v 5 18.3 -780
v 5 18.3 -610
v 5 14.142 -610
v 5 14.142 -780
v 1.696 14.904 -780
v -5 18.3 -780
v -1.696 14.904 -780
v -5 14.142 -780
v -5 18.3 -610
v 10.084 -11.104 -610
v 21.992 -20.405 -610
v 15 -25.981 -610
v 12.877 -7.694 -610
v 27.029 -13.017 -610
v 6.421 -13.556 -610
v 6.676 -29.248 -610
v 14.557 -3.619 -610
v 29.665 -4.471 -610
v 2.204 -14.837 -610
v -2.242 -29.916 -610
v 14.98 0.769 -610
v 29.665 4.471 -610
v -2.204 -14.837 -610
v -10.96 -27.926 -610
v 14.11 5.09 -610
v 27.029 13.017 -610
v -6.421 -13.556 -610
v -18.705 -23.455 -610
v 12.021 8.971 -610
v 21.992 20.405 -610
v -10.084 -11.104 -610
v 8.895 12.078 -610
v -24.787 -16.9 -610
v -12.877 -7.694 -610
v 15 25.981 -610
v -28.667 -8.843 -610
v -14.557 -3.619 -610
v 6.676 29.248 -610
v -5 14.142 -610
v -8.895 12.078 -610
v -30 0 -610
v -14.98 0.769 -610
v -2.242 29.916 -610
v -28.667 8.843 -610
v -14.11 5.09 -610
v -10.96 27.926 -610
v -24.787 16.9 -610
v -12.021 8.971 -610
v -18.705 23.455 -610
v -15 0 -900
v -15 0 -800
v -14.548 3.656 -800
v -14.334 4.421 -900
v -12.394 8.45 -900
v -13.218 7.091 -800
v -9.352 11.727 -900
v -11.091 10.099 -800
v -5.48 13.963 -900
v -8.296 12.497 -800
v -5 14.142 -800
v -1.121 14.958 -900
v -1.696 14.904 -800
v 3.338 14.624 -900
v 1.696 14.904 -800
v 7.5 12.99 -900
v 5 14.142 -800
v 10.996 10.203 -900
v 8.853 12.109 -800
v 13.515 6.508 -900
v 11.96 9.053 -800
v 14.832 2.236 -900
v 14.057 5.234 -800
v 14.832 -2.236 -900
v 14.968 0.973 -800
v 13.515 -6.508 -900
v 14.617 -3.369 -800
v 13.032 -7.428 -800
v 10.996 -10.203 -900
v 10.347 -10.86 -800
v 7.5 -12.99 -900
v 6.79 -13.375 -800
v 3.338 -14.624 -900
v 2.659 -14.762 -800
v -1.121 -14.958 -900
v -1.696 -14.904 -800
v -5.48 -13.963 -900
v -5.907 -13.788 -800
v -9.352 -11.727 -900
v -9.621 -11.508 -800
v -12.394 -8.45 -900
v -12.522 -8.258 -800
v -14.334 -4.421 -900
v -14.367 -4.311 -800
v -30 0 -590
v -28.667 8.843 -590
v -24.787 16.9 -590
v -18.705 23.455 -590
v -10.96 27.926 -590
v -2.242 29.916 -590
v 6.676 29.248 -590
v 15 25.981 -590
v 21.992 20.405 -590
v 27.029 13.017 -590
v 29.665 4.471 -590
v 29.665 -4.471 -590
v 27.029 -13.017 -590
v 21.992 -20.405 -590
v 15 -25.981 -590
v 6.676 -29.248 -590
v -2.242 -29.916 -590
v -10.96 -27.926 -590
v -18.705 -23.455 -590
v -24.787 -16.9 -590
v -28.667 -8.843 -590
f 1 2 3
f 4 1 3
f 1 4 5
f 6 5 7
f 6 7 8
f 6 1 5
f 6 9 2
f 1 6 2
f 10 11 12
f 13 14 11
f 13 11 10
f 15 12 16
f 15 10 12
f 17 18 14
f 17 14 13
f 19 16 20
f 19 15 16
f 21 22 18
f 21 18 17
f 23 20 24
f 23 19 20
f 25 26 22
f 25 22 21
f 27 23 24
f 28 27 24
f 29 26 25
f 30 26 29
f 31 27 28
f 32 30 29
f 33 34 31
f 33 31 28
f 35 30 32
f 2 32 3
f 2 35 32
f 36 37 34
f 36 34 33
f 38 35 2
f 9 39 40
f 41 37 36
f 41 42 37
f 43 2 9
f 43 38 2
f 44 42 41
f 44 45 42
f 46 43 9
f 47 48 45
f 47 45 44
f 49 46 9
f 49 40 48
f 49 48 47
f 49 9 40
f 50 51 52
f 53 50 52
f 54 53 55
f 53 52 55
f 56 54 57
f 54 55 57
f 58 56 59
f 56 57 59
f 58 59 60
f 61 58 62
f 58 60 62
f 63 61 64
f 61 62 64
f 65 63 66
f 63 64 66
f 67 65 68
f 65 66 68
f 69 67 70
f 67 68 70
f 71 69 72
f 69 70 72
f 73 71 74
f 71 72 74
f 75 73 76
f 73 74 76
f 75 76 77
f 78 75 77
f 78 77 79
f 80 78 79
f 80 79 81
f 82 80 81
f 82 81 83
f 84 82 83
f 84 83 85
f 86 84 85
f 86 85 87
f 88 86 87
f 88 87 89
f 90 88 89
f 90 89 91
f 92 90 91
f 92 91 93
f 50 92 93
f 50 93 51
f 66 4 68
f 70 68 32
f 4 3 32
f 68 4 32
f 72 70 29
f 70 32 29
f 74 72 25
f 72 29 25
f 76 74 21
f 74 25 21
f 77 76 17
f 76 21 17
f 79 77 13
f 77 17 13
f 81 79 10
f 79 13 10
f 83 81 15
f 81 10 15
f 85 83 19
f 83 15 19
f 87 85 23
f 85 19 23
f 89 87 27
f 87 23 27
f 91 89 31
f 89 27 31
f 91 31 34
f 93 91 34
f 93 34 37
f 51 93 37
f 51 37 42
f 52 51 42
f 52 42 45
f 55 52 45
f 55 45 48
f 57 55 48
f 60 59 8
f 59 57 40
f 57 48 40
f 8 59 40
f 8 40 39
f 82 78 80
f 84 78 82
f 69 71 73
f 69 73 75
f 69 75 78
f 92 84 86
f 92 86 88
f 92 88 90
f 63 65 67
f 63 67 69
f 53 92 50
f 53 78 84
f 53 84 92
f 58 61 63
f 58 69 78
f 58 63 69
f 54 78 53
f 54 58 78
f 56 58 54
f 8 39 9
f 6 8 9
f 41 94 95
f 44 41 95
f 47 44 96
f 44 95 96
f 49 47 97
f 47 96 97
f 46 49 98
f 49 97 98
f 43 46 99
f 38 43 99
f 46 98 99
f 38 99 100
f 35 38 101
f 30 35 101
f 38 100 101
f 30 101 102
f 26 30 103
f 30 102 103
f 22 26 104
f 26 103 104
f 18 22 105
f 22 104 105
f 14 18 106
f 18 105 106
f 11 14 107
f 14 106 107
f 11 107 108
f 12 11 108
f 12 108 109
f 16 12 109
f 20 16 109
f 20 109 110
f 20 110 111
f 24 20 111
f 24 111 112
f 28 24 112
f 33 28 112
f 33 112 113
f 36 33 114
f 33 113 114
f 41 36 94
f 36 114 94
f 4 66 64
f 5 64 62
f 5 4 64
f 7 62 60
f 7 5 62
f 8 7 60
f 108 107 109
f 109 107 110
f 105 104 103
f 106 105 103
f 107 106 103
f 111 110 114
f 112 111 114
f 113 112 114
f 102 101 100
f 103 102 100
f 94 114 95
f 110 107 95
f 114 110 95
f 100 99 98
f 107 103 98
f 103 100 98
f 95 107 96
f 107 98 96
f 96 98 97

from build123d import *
from build123d.topology import SkipClean

# Parameters (mm, degrees)
BOSS_EXTRUDE1_DEPTH = 800
SKETCH3_R           = 30
BOSS_EXTRUDE3_DEPTH = 20
SKETCH4_R           = 30
CUT_EXTRUDE1_DEPTH  = 1391.647331281
SKETCH5_R           = 15
BOSS_EXTRUDE4_DEPTH = 100
CUT_EXTRUDE2_START  = -20
CUT_EXTRUDE2_DEPTH  = 20


with BuildPart() as part:
    # Sketch1 → Boss-Extrude1 (new, symmetric)
    with BuildSketch(Plane.XY):
        with BuildLine():
            Line((-5, 14.142135624), (-5, 18.3))
            Line((-5, 18.3), (5, 18.3))
            Line((5, 18.3), (5, 14.142135624))
            ThreePointArc((5, 14.142135624), (0, -15), (-5, 14.142135624))
        make_face()
    extrude(amount=BOSS_EXTRUDE1_DEPTH, both=True)

    # Sketch3 → Boss-Extrude3 (add)
    with BuildSketch(Plane(origin=(0, 0, 590), x_dir=(-1, 0, 0), z_dir=(0, 0, -1))):
        Circle(SKETCH3_R)
    boss_extrude3 = extrude(amount=-BOSS_EXTRUDE3_DEPTH)

    # Mirror2: Boss-Extrude3 across plane
    add(boss_extrude3.mirror(Plane.XY))

    # Sketch4 → Cut-Extrude1 (cut, through all)
    with BuildSketch(Plane.XY.offset(-590)):
        with Locations(Location((0, 0, 0), (0, 0, 180))):
            Circle(SKETCH4_R)
    extrude(amount=CUT_EXTRUDE1_DEPTH, mode=Mode.SUBTRACT)

    # Sketch5 → Boss-Extrude4 (add)
    with BuildSketch(Plane(origin=(0, 0, -800), x_dir=(-1, 0, 0), z_dir=(0, 0, -1))):
        Circle(SKETCH5_R)
    extrude(amount=BOSS_EXTRUDE4_DEPTH)

    # Sketch6 → Cut-Extrude2 (cut)
    with SkipClean():  # the faces are left unmerged after this step: merging them gives an invalid solid
        with BuildSketch(Plane(origin=(0, 0, -800), x_dir=(-1, 0, 0), z_dir=(0, 0, -1)).offset(CUT_EXTRUDE2_START)):
            with BuildLine():
                Line((5, 14.142135624), (5, 18.3))
                Line((5, 18.3), (-5, 18.3))
                Line((-5, 18.3), (-5, 14.142135624))
                ThreePointArc((-5, 14.142135624), (0, 15), (5, 14.142135624))
            make_face()
        extrude(amount=CUT_EXTRUDE2_DEPTH, mode=Mode.SUBTRACT)


solid = part.part
